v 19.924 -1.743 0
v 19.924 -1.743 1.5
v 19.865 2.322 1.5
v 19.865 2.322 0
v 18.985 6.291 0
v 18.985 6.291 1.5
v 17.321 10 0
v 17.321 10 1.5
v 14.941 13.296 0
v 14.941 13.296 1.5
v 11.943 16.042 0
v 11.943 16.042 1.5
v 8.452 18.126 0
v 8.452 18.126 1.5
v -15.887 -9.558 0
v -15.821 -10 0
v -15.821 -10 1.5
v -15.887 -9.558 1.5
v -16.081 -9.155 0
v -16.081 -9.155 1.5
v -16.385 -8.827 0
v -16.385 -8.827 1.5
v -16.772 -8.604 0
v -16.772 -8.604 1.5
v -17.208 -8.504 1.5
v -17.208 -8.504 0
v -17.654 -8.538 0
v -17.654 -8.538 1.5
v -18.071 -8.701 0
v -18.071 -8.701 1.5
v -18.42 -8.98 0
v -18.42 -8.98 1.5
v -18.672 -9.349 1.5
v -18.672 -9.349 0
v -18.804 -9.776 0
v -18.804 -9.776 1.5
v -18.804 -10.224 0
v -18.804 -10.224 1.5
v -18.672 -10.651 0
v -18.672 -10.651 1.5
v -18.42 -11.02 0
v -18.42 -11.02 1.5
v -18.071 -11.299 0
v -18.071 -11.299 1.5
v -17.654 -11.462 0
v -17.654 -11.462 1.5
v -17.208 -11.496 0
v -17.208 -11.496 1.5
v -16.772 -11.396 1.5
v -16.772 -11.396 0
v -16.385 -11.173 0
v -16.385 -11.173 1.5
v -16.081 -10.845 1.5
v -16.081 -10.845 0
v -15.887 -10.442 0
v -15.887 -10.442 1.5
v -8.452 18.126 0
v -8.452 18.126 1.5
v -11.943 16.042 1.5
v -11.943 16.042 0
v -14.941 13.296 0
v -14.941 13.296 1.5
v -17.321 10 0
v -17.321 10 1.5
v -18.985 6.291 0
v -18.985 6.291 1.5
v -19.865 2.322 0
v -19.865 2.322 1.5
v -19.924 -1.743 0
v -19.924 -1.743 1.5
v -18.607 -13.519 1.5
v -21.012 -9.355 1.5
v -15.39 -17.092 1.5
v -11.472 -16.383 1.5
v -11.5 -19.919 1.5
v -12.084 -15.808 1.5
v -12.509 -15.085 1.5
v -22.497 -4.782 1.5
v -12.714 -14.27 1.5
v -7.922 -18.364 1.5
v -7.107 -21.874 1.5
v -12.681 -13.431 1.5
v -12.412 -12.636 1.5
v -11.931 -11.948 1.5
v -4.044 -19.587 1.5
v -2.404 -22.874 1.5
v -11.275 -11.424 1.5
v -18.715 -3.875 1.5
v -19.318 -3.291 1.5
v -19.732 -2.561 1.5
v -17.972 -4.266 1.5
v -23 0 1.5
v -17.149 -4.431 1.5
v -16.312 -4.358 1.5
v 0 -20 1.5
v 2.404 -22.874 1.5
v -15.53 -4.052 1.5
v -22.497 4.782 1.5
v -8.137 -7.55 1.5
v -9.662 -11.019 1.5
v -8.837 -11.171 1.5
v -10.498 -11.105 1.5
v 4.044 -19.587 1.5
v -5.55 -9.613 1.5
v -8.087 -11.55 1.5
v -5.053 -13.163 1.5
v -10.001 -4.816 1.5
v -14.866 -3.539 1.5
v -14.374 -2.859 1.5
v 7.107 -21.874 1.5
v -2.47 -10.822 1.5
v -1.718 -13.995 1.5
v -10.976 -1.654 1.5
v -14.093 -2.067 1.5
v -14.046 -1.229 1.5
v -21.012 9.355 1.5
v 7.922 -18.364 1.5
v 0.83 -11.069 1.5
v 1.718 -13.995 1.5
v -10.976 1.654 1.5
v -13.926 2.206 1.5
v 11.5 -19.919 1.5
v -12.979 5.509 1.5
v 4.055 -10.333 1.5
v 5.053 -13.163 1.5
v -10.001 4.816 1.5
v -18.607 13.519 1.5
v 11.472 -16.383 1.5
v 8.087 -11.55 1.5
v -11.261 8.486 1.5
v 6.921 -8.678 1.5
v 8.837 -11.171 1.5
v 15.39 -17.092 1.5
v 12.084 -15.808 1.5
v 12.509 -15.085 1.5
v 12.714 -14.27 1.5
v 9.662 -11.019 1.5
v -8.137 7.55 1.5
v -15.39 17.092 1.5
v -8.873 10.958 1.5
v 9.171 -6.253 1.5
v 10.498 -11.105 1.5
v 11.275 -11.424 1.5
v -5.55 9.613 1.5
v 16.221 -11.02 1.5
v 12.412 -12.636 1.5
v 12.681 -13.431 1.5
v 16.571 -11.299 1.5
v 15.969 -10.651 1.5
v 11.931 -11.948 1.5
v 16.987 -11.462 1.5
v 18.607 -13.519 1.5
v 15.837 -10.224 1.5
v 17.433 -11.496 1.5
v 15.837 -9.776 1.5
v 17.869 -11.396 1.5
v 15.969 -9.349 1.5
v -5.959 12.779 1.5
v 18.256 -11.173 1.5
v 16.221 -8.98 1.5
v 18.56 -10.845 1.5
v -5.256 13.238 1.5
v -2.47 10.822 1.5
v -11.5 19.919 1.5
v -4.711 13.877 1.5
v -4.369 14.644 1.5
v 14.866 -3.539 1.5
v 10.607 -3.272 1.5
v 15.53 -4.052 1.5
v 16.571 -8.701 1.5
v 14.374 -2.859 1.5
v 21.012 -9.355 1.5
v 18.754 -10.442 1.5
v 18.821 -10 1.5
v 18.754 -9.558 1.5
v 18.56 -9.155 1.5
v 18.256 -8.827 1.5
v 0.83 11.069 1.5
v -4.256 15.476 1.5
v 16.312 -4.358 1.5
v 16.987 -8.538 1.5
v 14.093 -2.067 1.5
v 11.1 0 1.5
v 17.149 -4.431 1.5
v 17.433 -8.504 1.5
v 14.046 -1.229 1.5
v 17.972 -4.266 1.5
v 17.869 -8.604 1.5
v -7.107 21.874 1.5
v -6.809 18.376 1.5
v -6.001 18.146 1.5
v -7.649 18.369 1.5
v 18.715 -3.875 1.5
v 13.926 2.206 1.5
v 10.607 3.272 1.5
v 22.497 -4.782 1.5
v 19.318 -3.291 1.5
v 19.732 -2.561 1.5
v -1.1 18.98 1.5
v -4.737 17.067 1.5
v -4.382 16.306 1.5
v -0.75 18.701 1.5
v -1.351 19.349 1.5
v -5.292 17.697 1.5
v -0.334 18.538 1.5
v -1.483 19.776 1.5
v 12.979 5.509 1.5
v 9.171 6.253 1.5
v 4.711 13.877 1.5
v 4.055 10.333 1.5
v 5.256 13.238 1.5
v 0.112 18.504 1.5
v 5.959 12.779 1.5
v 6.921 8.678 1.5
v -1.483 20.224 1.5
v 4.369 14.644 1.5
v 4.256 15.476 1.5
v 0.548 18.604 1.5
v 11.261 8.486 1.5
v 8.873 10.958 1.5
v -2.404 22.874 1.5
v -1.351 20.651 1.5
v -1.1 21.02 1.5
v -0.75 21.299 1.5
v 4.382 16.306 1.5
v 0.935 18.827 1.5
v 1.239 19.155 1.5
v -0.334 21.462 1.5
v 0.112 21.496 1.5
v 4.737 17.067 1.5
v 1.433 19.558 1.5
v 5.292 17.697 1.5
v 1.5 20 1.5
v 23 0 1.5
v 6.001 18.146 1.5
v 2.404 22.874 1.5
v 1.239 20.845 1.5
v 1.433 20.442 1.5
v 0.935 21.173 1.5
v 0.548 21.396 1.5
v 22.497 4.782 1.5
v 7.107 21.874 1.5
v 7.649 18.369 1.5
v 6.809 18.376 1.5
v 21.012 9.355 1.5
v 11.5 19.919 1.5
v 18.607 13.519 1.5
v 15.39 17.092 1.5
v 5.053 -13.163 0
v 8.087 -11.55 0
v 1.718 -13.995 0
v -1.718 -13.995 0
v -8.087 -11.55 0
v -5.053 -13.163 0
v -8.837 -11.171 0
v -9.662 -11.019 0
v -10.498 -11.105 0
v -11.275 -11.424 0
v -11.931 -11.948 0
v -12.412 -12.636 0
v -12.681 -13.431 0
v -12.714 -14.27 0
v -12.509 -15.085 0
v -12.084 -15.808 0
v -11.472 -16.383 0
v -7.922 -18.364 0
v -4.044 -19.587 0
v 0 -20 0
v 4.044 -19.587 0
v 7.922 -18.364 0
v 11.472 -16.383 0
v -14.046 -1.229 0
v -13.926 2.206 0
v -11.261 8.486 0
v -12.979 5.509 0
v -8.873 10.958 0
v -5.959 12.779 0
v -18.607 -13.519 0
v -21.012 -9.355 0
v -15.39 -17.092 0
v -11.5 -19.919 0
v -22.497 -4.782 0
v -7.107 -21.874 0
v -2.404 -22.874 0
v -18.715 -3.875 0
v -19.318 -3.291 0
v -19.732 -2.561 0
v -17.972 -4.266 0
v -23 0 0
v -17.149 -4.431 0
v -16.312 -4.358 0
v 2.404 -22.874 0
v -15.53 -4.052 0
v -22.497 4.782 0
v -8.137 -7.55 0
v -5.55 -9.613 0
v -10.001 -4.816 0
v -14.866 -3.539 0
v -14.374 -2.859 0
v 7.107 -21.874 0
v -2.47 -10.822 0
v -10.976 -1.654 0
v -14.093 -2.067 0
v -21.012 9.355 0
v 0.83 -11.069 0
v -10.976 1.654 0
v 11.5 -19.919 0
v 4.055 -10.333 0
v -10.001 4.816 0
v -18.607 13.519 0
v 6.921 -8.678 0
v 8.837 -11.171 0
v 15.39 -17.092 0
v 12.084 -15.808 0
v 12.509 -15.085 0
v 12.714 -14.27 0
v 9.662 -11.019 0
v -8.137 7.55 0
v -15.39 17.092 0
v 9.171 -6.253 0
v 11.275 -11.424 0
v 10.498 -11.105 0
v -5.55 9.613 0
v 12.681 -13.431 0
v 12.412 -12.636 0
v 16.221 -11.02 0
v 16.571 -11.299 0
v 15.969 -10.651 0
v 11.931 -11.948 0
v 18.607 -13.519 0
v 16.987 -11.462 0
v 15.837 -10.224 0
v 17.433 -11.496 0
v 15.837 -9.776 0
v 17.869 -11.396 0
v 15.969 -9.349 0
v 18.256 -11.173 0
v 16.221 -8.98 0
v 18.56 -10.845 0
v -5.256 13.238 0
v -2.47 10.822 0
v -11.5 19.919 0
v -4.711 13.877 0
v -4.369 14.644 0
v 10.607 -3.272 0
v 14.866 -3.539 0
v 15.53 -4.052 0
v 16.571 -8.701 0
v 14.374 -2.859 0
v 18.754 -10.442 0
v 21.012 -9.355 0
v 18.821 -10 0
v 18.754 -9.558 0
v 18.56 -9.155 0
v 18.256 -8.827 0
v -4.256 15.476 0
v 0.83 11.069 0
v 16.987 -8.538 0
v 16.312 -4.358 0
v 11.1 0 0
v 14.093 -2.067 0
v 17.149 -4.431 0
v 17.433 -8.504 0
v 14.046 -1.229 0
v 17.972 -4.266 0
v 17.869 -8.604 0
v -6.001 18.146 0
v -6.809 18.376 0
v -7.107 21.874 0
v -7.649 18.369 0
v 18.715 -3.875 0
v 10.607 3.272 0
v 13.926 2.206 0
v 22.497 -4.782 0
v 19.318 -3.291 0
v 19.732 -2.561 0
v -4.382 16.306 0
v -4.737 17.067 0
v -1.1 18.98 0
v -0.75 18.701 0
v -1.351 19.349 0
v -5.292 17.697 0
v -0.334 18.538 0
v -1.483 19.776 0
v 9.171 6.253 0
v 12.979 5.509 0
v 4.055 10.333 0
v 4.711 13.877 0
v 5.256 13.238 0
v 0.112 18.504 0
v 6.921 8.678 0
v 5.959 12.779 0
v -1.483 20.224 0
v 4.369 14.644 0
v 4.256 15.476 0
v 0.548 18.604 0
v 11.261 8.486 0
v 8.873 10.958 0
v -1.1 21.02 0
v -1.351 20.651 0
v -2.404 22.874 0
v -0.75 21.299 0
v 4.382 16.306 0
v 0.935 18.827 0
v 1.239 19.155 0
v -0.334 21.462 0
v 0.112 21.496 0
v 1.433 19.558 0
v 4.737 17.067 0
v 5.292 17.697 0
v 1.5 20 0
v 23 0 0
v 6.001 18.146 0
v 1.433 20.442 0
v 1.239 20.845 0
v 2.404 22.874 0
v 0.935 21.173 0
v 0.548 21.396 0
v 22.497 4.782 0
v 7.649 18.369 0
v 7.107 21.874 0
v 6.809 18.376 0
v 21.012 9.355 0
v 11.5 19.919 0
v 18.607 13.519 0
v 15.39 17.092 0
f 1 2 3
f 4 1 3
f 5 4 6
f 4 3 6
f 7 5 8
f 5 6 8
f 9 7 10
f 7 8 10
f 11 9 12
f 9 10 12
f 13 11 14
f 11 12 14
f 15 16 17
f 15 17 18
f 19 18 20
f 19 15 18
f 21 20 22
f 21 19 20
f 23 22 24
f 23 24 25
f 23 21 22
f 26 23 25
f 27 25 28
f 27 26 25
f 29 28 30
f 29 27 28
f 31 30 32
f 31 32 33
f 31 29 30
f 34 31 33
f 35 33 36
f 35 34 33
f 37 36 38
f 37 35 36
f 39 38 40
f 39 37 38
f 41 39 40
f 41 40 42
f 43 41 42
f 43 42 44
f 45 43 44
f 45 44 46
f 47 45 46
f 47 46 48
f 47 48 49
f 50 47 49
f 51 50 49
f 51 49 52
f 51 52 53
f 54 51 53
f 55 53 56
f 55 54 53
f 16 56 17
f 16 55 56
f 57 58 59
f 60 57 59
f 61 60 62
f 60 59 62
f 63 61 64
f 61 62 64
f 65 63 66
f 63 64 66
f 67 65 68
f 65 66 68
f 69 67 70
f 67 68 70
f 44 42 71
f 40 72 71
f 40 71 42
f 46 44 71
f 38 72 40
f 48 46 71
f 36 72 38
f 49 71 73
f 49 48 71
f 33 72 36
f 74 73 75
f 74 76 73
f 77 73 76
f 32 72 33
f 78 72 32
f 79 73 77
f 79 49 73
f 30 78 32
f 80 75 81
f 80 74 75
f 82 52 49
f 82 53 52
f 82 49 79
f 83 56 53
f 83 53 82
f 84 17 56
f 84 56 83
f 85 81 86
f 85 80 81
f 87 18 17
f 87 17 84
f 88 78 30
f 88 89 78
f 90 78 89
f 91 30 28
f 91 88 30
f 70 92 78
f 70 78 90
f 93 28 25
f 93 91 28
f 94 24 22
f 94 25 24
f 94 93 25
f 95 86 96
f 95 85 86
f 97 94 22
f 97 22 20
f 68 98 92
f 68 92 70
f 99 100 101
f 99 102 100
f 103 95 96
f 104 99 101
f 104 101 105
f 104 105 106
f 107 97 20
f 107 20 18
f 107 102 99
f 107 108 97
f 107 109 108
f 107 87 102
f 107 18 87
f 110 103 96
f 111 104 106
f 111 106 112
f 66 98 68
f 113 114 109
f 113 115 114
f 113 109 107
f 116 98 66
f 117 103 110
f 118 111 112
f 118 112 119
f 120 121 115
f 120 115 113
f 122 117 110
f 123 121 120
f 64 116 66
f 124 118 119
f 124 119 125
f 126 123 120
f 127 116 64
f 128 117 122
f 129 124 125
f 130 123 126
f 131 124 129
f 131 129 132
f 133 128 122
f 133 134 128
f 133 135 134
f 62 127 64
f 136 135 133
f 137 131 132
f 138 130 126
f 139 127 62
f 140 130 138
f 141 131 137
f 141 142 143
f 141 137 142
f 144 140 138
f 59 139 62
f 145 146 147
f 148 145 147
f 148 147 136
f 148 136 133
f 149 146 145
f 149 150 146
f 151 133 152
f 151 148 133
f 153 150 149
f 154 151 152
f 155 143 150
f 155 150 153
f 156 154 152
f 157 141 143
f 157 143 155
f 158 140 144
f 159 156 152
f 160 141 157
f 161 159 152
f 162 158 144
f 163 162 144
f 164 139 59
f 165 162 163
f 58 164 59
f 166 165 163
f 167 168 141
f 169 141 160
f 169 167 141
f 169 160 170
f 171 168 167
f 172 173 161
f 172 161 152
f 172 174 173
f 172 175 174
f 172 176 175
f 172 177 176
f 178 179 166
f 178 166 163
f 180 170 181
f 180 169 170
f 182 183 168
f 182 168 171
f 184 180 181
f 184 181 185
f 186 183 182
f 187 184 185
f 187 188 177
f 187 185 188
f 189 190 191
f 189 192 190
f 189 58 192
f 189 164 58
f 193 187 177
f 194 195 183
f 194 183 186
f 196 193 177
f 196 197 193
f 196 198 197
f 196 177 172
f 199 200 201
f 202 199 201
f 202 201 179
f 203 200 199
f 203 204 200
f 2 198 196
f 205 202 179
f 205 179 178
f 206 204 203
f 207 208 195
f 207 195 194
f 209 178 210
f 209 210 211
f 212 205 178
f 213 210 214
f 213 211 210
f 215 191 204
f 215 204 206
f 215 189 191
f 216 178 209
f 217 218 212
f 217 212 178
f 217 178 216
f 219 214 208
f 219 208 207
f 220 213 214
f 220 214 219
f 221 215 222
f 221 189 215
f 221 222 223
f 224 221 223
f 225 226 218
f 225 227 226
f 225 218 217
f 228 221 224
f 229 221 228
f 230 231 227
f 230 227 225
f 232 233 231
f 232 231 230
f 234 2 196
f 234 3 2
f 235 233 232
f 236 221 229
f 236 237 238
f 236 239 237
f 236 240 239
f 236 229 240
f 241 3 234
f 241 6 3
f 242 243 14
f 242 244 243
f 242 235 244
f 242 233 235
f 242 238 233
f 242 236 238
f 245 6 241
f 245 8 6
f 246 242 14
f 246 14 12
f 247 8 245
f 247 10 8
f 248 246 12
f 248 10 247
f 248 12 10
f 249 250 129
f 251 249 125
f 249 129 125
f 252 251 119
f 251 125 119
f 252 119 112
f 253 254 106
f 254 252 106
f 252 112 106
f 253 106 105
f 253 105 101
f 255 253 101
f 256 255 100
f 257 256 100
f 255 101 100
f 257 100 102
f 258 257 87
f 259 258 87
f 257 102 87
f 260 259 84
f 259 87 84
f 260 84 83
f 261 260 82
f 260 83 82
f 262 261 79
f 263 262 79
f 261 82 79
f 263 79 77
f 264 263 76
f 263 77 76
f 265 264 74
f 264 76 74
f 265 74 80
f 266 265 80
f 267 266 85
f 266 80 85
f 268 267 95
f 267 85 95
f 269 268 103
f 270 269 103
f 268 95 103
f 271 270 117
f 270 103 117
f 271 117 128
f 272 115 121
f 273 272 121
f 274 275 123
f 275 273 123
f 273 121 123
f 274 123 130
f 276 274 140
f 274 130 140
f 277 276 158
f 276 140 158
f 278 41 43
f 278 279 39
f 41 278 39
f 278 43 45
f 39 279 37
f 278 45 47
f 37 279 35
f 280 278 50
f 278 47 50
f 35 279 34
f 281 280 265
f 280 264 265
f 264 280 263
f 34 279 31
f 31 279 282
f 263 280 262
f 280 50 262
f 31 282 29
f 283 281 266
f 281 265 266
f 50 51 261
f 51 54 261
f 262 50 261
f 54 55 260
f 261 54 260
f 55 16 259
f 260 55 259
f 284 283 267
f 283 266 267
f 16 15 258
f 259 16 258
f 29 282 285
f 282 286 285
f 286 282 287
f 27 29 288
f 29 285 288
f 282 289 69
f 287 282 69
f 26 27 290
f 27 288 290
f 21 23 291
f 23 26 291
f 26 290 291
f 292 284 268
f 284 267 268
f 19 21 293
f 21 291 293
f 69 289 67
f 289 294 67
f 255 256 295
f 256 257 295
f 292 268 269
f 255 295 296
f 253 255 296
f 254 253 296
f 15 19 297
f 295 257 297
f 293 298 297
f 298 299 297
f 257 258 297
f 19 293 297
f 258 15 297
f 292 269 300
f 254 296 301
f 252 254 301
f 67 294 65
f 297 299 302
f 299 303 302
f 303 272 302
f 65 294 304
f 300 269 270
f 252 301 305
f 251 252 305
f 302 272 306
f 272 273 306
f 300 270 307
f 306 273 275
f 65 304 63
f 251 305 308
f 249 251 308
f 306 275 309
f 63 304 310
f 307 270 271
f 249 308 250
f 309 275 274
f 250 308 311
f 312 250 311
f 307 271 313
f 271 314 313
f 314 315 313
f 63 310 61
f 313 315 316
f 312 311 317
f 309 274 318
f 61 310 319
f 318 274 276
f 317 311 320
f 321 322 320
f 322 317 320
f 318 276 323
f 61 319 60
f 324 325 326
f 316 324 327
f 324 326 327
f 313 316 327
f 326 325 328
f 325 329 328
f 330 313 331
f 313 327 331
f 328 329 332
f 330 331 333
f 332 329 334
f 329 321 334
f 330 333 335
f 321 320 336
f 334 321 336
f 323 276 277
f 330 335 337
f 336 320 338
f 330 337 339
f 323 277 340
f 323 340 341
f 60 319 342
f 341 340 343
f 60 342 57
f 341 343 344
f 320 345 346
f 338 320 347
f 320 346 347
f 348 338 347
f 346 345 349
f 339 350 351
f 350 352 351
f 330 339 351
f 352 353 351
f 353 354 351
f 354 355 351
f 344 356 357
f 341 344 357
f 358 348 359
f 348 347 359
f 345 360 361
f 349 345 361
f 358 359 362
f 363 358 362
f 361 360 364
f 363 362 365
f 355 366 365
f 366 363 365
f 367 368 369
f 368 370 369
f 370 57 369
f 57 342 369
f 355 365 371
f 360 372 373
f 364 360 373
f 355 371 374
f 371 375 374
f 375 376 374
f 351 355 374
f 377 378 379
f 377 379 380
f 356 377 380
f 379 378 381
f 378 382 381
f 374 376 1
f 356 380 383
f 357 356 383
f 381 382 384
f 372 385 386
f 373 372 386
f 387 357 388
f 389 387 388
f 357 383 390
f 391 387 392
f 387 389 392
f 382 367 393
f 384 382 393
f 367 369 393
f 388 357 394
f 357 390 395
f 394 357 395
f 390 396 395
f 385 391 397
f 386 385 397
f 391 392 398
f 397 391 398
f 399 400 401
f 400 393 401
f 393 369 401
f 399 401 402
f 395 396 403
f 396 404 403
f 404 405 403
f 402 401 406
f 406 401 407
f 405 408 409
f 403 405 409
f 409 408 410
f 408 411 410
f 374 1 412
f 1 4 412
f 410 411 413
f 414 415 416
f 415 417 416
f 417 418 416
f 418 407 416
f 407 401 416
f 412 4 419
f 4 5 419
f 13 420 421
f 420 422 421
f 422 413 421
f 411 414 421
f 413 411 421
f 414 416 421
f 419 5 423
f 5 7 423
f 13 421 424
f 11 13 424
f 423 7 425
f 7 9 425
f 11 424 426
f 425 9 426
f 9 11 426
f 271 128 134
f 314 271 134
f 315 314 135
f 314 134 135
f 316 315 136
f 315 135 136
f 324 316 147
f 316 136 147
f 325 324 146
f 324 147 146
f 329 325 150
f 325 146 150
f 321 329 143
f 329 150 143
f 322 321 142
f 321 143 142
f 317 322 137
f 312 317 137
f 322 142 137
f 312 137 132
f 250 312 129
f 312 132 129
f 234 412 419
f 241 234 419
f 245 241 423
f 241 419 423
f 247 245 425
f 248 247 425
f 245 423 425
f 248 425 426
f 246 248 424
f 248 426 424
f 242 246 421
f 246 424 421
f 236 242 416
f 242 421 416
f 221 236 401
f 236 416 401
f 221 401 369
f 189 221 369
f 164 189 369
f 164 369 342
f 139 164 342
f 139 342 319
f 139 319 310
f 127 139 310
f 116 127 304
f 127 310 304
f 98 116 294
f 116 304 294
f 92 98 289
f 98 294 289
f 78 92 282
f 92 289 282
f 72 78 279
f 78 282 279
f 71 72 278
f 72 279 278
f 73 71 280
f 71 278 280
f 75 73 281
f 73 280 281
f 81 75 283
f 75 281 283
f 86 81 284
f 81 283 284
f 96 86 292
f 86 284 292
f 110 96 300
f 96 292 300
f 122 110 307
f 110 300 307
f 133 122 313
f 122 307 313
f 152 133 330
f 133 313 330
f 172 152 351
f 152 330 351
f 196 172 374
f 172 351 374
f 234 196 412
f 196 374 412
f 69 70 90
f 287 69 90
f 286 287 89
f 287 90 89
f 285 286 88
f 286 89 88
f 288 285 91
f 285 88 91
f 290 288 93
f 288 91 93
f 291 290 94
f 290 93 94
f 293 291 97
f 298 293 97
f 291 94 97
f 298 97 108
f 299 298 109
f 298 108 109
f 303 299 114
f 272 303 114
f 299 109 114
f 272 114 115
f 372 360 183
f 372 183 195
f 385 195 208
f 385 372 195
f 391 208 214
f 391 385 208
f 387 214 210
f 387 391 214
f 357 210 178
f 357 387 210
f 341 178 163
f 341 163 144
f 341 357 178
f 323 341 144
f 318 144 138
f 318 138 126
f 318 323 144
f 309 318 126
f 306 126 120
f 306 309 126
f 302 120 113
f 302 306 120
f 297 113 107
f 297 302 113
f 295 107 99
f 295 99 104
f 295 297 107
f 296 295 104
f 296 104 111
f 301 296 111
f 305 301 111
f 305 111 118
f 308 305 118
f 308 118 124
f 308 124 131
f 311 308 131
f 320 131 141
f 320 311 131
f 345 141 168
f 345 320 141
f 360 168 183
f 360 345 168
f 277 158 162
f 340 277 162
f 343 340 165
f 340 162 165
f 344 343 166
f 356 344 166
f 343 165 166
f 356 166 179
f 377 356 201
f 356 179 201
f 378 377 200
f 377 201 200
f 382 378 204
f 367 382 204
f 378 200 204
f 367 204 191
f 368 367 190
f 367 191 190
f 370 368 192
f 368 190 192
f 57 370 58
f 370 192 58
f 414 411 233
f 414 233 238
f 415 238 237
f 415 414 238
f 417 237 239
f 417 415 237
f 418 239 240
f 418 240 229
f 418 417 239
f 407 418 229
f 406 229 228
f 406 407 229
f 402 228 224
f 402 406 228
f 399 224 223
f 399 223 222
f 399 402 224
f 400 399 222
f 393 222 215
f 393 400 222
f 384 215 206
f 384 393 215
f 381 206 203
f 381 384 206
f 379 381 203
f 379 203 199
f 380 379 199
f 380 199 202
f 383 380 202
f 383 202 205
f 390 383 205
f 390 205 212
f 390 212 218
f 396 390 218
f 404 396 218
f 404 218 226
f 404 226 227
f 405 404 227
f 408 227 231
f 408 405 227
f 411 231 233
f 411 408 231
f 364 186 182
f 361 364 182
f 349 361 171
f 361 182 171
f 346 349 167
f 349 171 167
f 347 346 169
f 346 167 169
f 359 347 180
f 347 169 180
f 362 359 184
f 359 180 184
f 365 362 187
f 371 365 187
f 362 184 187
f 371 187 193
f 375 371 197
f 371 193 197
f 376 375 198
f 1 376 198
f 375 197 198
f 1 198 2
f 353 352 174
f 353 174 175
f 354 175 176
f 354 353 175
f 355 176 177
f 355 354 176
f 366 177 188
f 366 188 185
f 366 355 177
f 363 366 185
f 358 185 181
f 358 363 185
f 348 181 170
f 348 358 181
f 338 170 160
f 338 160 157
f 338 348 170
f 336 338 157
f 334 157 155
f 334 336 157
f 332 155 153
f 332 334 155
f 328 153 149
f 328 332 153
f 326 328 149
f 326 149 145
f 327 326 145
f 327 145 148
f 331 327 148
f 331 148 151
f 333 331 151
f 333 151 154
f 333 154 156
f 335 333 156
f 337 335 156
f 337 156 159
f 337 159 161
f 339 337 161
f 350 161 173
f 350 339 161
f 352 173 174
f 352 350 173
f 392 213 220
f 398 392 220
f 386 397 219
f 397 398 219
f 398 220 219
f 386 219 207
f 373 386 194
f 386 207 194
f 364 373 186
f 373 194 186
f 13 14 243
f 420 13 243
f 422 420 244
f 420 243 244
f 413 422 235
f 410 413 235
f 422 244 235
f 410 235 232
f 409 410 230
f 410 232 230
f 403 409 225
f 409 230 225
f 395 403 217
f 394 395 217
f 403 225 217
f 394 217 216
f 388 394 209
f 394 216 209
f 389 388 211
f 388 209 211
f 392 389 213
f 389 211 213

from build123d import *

# Parameters (mm, degrees)
SKETCH_1_R          = 23
SKETCH_1_R_2        = 1.5
SKETCH_1_R_3        = 11.1
EXTRUDE_1_DEPTH     = 1.5
CUT_EXTRUDE_1_DEPTH = 2.5


with BuildPart() as part:
    # 草图1 → 凸台-拉伸1 (new body)
    with BuildSketch(Plane.XY):
        Circle(SKETCH_1_R)
        with Locations((0, 20)):
            Circle(SKETCH_1_R_2, mode=Mode.SUBTRACT)
        Circle(SKETCH_1_R_3, mode=Mode.SUBTRACT)
        with Locations((17.320508076, -10)):
            Circle(SKETCH_1_R_2, mode=Mode.SUBTRACT)
        with Locations((-17.320508076, -10)):
            Circle(SKETCH_1_R_2, mode=Mode.SUBTRACT)
    extrude(amount=EXTRUDE_1_DEPTH)

    # 草图2 → 切除-拉伸1 (cut, through all)
    with BuildSketch(Plane.XY.offset(1.5)):
        with BuildLine():
            ThreePointArc((-8.452365235, 18.126155741), (-17.320508076, 10), (-19.923893962, -1.743114855))
            ThreePointArc((-19.923893962, -1.743114855), (-16.728010161, -4.424779773), (-14.046345243, -1.228895973))
            ThreePointArc((-14.046345243, -1.228895973), (-12.210958193, 7.05), (-5.958917491, 12.778939797))
            ThreePointArc((-5.958917491, 12.778939797), (-4.532033391, 16.699271641), (-8.452365235, 18.126155741))
        make_face()
        with BuildLine():
            ThreePointArc((19.923893962, -1.743114855), (17.320508076, 10), (8.452365235, 18.126155741))
            ThreePointArc((8.452365235, 18.126155741), (4.532033391, 16.699271641), (5.958917491, 12.778939797))
            ThreePointArc((5.958917491, 12.778939797), (12.210958193, 7.05), (14.046345243, -1.228895973))
            ThreePointArc((14.046345243, -1.228895973), (16.728010161, -4.424779773), (19.923893962, -1.743114855))
        make_face()
        with BuildLine():
            ThreePointArc((-11.471528727, -16.383040886), (0, -20), (11.471528727, -16.383040886))
            ThreePointArc((11.471528727, -16.383040886), (12.19597677, -12.274491868), (8.087427753, -11.550043824))
            ThreePointArc((8.087427753, -11.550043824), (0, -14.1), (-8.087427753, -11.550043824))
            ThreePointArc((-8.087427753, -11.550043824), (-12.19597677, -12.274491868), (-11.471528727, -16.383040886))
        make_face()
    extrude(amount=-CUT_EXTRUDE_1_DEPTH, mode=Mode.SUBTRACT)


solid = part.part
